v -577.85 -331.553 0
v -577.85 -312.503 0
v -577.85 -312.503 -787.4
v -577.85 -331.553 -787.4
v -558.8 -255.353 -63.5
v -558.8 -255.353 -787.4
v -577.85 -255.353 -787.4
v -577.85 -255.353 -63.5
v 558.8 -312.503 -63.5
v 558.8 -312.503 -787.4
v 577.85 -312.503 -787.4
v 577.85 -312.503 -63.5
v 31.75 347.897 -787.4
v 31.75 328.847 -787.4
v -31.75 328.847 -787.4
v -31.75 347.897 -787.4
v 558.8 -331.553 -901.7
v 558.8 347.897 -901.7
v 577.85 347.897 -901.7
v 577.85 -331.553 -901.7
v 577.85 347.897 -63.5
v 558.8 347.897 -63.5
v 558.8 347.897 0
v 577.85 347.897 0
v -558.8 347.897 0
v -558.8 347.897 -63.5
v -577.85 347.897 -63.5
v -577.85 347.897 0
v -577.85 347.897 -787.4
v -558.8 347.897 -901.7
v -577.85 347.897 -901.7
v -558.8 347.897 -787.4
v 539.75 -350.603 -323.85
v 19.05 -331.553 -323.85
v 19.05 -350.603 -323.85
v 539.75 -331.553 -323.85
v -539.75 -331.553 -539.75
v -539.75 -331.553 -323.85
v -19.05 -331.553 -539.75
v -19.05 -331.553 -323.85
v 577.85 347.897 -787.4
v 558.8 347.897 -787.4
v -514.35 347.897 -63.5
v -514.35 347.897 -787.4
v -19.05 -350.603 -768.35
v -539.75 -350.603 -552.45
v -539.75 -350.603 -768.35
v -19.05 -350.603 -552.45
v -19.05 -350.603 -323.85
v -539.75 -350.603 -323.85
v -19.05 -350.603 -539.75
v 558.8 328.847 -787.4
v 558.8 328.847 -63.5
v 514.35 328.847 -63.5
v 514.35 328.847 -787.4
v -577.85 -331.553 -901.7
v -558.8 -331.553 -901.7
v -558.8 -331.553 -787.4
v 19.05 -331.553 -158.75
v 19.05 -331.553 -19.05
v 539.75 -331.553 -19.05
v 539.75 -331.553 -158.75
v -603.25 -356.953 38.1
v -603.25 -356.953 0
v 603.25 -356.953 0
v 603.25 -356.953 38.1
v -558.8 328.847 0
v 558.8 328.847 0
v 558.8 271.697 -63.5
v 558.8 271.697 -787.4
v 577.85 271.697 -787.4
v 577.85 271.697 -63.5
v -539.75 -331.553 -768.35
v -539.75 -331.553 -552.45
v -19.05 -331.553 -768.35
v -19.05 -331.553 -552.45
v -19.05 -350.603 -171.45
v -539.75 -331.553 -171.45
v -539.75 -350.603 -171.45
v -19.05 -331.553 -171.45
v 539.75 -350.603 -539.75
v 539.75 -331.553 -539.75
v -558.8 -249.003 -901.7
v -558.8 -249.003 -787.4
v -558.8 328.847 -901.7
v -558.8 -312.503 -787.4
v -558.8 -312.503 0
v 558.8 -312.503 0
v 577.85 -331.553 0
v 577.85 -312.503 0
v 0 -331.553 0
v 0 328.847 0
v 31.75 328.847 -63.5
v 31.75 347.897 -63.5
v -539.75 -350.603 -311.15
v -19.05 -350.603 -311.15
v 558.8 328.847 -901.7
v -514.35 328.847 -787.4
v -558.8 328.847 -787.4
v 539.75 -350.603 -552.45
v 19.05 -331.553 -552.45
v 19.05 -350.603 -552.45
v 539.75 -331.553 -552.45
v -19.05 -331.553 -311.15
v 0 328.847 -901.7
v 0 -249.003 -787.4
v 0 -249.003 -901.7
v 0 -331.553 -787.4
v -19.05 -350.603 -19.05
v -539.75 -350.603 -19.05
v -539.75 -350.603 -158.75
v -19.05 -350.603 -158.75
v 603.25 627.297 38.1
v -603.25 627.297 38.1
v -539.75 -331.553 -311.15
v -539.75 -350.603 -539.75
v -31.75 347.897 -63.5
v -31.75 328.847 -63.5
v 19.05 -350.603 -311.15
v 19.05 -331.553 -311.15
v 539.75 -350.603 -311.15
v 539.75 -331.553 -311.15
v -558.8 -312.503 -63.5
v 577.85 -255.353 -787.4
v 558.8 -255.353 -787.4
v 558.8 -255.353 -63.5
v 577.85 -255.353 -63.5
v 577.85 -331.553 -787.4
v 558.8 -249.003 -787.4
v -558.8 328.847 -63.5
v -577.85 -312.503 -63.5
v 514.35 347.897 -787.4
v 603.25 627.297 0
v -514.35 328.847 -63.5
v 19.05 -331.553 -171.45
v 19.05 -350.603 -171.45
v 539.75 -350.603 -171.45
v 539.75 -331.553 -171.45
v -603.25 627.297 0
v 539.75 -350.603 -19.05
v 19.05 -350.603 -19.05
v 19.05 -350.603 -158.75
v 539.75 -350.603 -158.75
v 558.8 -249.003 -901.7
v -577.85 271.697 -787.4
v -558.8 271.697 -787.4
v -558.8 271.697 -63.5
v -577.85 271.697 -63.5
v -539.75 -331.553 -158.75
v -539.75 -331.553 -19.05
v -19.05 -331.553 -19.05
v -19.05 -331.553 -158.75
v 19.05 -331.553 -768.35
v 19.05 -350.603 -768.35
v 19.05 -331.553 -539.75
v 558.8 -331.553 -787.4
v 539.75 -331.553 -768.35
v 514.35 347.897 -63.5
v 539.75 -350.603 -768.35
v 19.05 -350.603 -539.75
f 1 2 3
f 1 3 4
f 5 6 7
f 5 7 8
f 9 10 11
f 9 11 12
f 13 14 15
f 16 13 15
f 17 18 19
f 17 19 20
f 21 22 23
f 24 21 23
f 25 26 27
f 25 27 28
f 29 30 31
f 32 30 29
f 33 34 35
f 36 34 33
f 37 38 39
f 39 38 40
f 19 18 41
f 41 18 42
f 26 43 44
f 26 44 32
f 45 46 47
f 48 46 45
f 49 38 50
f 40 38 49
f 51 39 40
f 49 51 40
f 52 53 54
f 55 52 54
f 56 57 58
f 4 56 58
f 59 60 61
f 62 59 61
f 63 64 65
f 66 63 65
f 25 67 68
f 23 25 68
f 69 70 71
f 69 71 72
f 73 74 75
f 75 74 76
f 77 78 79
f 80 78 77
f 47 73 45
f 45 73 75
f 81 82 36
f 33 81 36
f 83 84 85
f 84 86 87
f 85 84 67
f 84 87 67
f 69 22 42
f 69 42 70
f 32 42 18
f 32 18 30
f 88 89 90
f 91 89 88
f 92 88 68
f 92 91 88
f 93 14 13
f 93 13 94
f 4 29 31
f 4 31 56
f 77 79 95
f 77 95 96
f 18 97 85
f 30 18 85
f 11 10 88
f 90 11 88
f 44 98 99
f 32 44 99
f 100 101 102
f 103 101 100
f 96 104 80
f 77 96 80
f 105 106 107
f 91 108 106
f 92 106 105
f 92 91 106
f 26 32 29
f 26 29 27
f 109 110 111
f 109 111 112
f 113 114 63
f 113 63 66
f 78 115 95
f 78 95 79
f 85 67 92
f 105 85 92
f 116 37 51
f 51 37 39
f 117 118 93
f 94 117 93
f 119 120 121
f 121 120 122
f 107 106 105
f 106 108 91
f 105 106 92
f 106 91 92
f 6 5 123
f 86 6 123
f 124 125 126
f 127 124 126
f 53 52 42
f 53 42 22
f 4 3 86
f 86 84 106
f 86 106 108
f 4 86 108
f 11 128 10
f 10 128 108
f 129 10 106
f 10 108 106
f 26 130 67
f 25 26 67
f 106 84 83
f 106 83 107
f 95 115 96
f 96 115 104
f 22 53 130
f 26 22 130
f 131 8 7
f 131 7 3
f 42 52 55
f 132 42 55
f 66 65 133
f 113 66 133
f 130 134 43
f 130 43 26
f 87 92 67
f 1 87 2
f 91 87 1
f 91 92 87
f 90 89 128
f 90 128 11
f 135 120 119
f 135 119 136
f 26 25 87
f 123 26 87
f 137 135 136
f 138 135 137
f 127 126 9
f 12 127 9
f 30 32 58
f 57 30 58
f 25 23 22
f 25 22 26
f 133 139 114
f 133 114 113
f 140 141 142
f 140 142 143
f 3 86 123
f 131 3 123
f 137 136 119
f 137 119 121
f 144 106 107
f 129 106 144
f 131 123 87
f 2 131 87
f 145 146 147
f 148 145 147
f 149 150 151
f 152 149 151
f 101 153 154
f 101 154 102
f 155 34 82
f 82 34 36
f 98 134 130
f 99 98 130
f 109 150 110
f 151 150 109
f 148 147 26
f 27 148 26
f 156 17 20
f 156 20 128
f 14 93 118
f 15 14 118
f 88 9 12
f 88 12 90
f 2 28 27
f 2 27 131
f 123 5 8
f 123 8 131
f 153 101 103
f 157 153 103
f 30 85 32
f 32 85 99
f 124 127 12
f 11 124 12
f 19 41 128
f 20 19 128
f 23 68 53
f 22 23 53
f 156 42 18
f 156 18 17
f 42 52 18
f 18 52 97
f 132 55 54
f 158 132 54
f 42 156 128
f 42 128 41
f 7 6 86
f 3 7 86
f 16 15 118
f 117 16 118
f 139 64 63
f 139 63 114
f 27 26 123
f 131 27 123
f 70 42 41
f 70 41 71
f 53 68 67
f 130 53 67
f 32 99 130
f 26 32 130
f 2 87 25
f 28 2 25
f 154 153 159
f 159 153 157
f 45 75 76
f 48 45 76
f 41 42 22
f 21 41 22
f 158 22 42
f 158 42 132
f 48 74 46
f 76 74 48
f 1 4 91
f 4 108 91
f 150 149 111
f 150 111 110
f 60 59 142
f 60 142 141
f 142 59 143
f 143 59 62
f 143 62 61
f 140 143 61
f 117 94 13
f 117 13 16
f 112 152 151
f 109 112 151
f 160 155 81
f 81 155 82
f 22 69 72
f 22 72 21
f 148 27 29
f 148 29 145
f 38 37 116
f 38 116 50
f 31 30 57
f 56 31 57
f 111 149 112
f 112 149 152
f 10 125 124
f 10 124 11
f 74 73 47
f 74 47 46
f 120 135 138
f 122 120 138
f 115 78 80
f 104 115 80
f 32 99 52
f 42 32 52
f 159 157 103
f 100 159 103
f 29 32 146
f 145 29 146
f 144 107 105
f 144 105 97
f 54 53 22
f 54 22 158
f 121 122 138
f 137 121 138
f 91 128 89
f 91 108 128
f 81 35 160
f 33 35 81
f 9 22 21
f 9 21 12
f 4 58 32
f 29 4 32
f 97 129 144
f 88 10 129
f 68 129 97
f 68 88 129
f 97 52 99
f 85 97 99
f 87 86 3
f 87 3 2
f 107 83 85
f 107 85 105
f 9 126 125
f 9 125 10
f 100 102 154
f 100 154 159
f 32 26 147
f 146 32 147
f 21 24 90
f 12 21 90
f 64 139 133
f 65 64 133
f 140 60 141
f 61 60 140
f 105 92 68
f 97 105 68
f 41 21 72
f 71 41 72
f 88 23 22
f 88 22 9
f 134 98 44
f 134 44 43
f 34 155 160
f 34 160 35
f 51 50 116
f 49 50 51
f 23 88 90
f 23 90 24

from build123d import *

# Parameters (mm, degrees)
F0_W      = 558.8
F0_H      = 660.4
F1_DEPTH  = 901.7
F2_DEPTH  = 901.7
F3_W      = 558.8
F3_H      = 114.3
F4_DEPTH  = 82.55
F5_W      = 19.05
F5_H      = 787.4
F6_DEPTH  = 19.05
F7_W      = 19.05
F7_H      = 787.4
F8_DEPTH  = 19.05
F9_W      = 19.05
F9_H      = 63.5
F9_H_2    = 114.3
F10_DEPTH = 19.05
F9_W_2    = 57.15
F9_H_3    = 723.9
F11_DEPTH = 19.05
F14_DEPTH = 19.05
F13_W     = 44.45
F13_H     = 723.9
F13_W_2   = 31.75
F15_DEPTH = 19.05
F16_W     = 1206.5
F16_H     = 984.25
F16_W_2   = 558.8
F16_H_2   = 660.4
F17_DEPTH = 38.1
F18_W     = 520.7
F18_H     = 139.7
F18_H_2   = 215.9
F19_DEPTH = 19.05


with BuildPart() as f1:
    # F0 (on Top) → F1 (new body)
    with BuildSketch(Plane.XY):
        with Locations((-279.4, -1.352771)):
            Rectangle(F0_W, F0_H)
    extrude(amount=-F1_DEPTH)


with BuildPart() as f2:
    # F0 (on Top) → F2 (new body)
    with BuildSketch(Plane.XY):
        with Locations((279.4, -1.352771)):
            Rectangle(F0_W, F0_H)
    extrude(amount=-F2_DEPTH)


with BuildPart() as f4_tool:
    # F3 (on face) → F4 (new body)
    with BuildSketch(Plane.XZ.offset(331.552771)):
        with Locations((-279.4, -844.55)):
            Rectangle(F3_W, F3_H)
        with Locations((279.4, -844.55)):
            Rectangle(F3_W, F3_H)
    extrude(amount=-F4_DEPTH)


with BuildPart() as f1_1:
    add(f1.part)

    # F4: cut by f4_tool
    add(f4_tool.part, mode=Mode.SUBTRACT)

    # F5 (on face) → F6 (join)
    with BuildSketch(Plane(origin=(-558.8, 0, 0), x_dir=(0, -1, 0), z_dir=(-1, 0, 0))):
        with Locations((322.027771, -393.7)):
            Rectangle(F5_W, F5_H)
    extrude(amount=F6_DEPTH)


with BuildPart() as f2_1:
    add(f2.part)

    # F4: cut by f4_tool
    add(f4_tool.part, mode=Mode.SUBTRACT)

    # F7 (on face) → F8 (join)
    with BuildSketch(Plane.YZ.offset(558.8)):
        with Locations((-322.027771, -393.7)):
            Rectangle(F7_W, F7_H)
    extrude(amount=F8_DEPTH)


with BuildPart() as f10:
    # F9 (on face) → F10 (new body)
    with BuildSketch(Plane(origin=(-558.8, 0, 0), x_dir=(0, -1, 0), z_dir=(-1, 0, 0))):
        Polygon((-328.847229, -901.7), (249.002771, -901.7), (249.002771, -787.4), (-271.697229, -787.4), (-328.847229, -787.4), align=None)
        with Locations((-338.372229, -31.75)):
            Rectangle(F9_W, F9_H)
        Polygon((255.352771, -63.5), (312.502771, -63.5), (312.502771, 0), (-328.847229, 0), (-328.847229, -63.5), (-271.697229, -63.5), align=None)
        with Locations((-338.372229, -844.55)):
            Rectangle(F9_W, F9_H_2)
        Polygon((249.002771, -901.7), (331.552771, -901.7), (331.552771, -787.4), (312.502771, -787.4), (255.352771, -787.4), (249.002771, -787.4), align=None)
    extrude(amount=F10_DEPTH)


with BuildPart() as f11:
    # F9 (on face) → F11 (new body)
    with BuildSketch(Plane(origin=(-558.8, 0, 0), x_dir=(0, -1, 0), z_dir=(-1, 0, 0))):
        with Locations((-300.272229, -425.45)):
            Rectangle(F9_W_2, F9_H_3)
        with Locations((-338.372229, -425.45)):
            Rectangle(F9_W, F9_H_3)
        with Locations((283.927771, -425.45)):
            Rectangle(F9_W_2, F9_H_3)
    extrude(amount=F11_DEPTH)


with BuildPart() as f12_1:
    # F12: instance of F10
    add(f10.part.mirror(Plane.YZ))


with BuildPart() as f12_2:
    # F12: instance of F11
    add(f11.part.mirror(Plane.YZ))


with BuildPart() as f14:
    # F13 (on face) → F14 (new body)
    with BuildSketch(Plane(origin=(0, 328.847229, 0), x_dir=(-1, 0, 0), z_dir=(0, 1, 0))):
        Polygon((0, 0), (-558.8, 0), (-558.8, -63.5), (-514.35, -63.5), (-31.75, -63.5), (0, -63.5), align=None)
        Polygon((558.8, 0), (0, 0), (0, -63.5), (31.75, -63.5), (514.35, -63.5), (558.8, -63.5), align=None)
        Polygon((-514.35, -787.4), (-558.8, -787.4), (-558.8, -901.7), (0, -901.7), (0, -787.4), (-31.75, -787.4), align=None)
        Polygon((31.75, -787.4), (0, -787.4), (0, -901.7), (558.8, -901.7), (558.8, -787.4), (514.35, -787.4), align=None)
    extrude(amount=F14_DEPTH)


with BuildPart() as f15:
    # F13 (on face) → F15 (new body)
    with BuildSketch(Plane(origin=(0, 328.847229, 0), x_dir=(-1, 0, 0), z_dir=(0, 1, 0))):
        with Locations((-536.575, -425.45)):
            Rectangle(F13_W, F13_H)
        with Locations((15.875, -425.45)):
            Rectangle(F13_W_2, F13_H)
        with Locations((-15.875, -425.45)):
            Rectangle(F13_W_2, F13_H)
        with Locations((536.575, -425.45)):
            Rectangle(F13_W, F13_H)
    extrude(amount=F15_DEPTH)


with BuildPart() as f17:
    # F16 (on face) → F17 (new body)
    with BuildSketch(Plane.XY):
        with Locations((0, 135.172229)):
            Rectangle(F16_W, F16_H)
        with Locations((-279.4, -1.352771)):
            Rectangle(F16_W_2, F16_H_2, mode=Mode.SUBTRACT)
        with Locations((-279.4, -1.352771)):
            Rectangle(F16_W_2, F16_H_2)
    extrude(amount=F17_DEPTH)


with BuildPart() as f19:
    # F18 (on face) → F19 (new body)
    with BuildSketch(Plane.XZ.offset(331.552771)):
        with Locations((-279.4, -88.9)):
            Rectangle(F18_W, F18_H)
        with Locations((279.4, -88.9)):
            Rectangle(F18_W, F18_H)
        with Locations((279.4, -241.3)):
            Rectangle(F18_W, F18_H)
        with Locations((-279.4, -241.3)):
            Rectangle(F18_W, F18_H)
        with Locations((-279.4, -431.8)):
            Rectangle(F18_W, F18_H_2)
        with Locations((279.4, -431.8)):
            Rectangle(F18_W, F18_H_2)
        with Locations((279.4, -660.4)):
            Rectangle(F18_W, F18_H_2)
        with Locations((-279.4, -660.4)):
            Rectangle(F18_W, F18_H_2)
    extrude(amount=F19_DEPTH)


solid = Compound([f1_1.part, f2_1.part, f10.part, f11.part, f12_1.part, f12_2.part, f14.part, f15.part, f17.part, f19.part])
